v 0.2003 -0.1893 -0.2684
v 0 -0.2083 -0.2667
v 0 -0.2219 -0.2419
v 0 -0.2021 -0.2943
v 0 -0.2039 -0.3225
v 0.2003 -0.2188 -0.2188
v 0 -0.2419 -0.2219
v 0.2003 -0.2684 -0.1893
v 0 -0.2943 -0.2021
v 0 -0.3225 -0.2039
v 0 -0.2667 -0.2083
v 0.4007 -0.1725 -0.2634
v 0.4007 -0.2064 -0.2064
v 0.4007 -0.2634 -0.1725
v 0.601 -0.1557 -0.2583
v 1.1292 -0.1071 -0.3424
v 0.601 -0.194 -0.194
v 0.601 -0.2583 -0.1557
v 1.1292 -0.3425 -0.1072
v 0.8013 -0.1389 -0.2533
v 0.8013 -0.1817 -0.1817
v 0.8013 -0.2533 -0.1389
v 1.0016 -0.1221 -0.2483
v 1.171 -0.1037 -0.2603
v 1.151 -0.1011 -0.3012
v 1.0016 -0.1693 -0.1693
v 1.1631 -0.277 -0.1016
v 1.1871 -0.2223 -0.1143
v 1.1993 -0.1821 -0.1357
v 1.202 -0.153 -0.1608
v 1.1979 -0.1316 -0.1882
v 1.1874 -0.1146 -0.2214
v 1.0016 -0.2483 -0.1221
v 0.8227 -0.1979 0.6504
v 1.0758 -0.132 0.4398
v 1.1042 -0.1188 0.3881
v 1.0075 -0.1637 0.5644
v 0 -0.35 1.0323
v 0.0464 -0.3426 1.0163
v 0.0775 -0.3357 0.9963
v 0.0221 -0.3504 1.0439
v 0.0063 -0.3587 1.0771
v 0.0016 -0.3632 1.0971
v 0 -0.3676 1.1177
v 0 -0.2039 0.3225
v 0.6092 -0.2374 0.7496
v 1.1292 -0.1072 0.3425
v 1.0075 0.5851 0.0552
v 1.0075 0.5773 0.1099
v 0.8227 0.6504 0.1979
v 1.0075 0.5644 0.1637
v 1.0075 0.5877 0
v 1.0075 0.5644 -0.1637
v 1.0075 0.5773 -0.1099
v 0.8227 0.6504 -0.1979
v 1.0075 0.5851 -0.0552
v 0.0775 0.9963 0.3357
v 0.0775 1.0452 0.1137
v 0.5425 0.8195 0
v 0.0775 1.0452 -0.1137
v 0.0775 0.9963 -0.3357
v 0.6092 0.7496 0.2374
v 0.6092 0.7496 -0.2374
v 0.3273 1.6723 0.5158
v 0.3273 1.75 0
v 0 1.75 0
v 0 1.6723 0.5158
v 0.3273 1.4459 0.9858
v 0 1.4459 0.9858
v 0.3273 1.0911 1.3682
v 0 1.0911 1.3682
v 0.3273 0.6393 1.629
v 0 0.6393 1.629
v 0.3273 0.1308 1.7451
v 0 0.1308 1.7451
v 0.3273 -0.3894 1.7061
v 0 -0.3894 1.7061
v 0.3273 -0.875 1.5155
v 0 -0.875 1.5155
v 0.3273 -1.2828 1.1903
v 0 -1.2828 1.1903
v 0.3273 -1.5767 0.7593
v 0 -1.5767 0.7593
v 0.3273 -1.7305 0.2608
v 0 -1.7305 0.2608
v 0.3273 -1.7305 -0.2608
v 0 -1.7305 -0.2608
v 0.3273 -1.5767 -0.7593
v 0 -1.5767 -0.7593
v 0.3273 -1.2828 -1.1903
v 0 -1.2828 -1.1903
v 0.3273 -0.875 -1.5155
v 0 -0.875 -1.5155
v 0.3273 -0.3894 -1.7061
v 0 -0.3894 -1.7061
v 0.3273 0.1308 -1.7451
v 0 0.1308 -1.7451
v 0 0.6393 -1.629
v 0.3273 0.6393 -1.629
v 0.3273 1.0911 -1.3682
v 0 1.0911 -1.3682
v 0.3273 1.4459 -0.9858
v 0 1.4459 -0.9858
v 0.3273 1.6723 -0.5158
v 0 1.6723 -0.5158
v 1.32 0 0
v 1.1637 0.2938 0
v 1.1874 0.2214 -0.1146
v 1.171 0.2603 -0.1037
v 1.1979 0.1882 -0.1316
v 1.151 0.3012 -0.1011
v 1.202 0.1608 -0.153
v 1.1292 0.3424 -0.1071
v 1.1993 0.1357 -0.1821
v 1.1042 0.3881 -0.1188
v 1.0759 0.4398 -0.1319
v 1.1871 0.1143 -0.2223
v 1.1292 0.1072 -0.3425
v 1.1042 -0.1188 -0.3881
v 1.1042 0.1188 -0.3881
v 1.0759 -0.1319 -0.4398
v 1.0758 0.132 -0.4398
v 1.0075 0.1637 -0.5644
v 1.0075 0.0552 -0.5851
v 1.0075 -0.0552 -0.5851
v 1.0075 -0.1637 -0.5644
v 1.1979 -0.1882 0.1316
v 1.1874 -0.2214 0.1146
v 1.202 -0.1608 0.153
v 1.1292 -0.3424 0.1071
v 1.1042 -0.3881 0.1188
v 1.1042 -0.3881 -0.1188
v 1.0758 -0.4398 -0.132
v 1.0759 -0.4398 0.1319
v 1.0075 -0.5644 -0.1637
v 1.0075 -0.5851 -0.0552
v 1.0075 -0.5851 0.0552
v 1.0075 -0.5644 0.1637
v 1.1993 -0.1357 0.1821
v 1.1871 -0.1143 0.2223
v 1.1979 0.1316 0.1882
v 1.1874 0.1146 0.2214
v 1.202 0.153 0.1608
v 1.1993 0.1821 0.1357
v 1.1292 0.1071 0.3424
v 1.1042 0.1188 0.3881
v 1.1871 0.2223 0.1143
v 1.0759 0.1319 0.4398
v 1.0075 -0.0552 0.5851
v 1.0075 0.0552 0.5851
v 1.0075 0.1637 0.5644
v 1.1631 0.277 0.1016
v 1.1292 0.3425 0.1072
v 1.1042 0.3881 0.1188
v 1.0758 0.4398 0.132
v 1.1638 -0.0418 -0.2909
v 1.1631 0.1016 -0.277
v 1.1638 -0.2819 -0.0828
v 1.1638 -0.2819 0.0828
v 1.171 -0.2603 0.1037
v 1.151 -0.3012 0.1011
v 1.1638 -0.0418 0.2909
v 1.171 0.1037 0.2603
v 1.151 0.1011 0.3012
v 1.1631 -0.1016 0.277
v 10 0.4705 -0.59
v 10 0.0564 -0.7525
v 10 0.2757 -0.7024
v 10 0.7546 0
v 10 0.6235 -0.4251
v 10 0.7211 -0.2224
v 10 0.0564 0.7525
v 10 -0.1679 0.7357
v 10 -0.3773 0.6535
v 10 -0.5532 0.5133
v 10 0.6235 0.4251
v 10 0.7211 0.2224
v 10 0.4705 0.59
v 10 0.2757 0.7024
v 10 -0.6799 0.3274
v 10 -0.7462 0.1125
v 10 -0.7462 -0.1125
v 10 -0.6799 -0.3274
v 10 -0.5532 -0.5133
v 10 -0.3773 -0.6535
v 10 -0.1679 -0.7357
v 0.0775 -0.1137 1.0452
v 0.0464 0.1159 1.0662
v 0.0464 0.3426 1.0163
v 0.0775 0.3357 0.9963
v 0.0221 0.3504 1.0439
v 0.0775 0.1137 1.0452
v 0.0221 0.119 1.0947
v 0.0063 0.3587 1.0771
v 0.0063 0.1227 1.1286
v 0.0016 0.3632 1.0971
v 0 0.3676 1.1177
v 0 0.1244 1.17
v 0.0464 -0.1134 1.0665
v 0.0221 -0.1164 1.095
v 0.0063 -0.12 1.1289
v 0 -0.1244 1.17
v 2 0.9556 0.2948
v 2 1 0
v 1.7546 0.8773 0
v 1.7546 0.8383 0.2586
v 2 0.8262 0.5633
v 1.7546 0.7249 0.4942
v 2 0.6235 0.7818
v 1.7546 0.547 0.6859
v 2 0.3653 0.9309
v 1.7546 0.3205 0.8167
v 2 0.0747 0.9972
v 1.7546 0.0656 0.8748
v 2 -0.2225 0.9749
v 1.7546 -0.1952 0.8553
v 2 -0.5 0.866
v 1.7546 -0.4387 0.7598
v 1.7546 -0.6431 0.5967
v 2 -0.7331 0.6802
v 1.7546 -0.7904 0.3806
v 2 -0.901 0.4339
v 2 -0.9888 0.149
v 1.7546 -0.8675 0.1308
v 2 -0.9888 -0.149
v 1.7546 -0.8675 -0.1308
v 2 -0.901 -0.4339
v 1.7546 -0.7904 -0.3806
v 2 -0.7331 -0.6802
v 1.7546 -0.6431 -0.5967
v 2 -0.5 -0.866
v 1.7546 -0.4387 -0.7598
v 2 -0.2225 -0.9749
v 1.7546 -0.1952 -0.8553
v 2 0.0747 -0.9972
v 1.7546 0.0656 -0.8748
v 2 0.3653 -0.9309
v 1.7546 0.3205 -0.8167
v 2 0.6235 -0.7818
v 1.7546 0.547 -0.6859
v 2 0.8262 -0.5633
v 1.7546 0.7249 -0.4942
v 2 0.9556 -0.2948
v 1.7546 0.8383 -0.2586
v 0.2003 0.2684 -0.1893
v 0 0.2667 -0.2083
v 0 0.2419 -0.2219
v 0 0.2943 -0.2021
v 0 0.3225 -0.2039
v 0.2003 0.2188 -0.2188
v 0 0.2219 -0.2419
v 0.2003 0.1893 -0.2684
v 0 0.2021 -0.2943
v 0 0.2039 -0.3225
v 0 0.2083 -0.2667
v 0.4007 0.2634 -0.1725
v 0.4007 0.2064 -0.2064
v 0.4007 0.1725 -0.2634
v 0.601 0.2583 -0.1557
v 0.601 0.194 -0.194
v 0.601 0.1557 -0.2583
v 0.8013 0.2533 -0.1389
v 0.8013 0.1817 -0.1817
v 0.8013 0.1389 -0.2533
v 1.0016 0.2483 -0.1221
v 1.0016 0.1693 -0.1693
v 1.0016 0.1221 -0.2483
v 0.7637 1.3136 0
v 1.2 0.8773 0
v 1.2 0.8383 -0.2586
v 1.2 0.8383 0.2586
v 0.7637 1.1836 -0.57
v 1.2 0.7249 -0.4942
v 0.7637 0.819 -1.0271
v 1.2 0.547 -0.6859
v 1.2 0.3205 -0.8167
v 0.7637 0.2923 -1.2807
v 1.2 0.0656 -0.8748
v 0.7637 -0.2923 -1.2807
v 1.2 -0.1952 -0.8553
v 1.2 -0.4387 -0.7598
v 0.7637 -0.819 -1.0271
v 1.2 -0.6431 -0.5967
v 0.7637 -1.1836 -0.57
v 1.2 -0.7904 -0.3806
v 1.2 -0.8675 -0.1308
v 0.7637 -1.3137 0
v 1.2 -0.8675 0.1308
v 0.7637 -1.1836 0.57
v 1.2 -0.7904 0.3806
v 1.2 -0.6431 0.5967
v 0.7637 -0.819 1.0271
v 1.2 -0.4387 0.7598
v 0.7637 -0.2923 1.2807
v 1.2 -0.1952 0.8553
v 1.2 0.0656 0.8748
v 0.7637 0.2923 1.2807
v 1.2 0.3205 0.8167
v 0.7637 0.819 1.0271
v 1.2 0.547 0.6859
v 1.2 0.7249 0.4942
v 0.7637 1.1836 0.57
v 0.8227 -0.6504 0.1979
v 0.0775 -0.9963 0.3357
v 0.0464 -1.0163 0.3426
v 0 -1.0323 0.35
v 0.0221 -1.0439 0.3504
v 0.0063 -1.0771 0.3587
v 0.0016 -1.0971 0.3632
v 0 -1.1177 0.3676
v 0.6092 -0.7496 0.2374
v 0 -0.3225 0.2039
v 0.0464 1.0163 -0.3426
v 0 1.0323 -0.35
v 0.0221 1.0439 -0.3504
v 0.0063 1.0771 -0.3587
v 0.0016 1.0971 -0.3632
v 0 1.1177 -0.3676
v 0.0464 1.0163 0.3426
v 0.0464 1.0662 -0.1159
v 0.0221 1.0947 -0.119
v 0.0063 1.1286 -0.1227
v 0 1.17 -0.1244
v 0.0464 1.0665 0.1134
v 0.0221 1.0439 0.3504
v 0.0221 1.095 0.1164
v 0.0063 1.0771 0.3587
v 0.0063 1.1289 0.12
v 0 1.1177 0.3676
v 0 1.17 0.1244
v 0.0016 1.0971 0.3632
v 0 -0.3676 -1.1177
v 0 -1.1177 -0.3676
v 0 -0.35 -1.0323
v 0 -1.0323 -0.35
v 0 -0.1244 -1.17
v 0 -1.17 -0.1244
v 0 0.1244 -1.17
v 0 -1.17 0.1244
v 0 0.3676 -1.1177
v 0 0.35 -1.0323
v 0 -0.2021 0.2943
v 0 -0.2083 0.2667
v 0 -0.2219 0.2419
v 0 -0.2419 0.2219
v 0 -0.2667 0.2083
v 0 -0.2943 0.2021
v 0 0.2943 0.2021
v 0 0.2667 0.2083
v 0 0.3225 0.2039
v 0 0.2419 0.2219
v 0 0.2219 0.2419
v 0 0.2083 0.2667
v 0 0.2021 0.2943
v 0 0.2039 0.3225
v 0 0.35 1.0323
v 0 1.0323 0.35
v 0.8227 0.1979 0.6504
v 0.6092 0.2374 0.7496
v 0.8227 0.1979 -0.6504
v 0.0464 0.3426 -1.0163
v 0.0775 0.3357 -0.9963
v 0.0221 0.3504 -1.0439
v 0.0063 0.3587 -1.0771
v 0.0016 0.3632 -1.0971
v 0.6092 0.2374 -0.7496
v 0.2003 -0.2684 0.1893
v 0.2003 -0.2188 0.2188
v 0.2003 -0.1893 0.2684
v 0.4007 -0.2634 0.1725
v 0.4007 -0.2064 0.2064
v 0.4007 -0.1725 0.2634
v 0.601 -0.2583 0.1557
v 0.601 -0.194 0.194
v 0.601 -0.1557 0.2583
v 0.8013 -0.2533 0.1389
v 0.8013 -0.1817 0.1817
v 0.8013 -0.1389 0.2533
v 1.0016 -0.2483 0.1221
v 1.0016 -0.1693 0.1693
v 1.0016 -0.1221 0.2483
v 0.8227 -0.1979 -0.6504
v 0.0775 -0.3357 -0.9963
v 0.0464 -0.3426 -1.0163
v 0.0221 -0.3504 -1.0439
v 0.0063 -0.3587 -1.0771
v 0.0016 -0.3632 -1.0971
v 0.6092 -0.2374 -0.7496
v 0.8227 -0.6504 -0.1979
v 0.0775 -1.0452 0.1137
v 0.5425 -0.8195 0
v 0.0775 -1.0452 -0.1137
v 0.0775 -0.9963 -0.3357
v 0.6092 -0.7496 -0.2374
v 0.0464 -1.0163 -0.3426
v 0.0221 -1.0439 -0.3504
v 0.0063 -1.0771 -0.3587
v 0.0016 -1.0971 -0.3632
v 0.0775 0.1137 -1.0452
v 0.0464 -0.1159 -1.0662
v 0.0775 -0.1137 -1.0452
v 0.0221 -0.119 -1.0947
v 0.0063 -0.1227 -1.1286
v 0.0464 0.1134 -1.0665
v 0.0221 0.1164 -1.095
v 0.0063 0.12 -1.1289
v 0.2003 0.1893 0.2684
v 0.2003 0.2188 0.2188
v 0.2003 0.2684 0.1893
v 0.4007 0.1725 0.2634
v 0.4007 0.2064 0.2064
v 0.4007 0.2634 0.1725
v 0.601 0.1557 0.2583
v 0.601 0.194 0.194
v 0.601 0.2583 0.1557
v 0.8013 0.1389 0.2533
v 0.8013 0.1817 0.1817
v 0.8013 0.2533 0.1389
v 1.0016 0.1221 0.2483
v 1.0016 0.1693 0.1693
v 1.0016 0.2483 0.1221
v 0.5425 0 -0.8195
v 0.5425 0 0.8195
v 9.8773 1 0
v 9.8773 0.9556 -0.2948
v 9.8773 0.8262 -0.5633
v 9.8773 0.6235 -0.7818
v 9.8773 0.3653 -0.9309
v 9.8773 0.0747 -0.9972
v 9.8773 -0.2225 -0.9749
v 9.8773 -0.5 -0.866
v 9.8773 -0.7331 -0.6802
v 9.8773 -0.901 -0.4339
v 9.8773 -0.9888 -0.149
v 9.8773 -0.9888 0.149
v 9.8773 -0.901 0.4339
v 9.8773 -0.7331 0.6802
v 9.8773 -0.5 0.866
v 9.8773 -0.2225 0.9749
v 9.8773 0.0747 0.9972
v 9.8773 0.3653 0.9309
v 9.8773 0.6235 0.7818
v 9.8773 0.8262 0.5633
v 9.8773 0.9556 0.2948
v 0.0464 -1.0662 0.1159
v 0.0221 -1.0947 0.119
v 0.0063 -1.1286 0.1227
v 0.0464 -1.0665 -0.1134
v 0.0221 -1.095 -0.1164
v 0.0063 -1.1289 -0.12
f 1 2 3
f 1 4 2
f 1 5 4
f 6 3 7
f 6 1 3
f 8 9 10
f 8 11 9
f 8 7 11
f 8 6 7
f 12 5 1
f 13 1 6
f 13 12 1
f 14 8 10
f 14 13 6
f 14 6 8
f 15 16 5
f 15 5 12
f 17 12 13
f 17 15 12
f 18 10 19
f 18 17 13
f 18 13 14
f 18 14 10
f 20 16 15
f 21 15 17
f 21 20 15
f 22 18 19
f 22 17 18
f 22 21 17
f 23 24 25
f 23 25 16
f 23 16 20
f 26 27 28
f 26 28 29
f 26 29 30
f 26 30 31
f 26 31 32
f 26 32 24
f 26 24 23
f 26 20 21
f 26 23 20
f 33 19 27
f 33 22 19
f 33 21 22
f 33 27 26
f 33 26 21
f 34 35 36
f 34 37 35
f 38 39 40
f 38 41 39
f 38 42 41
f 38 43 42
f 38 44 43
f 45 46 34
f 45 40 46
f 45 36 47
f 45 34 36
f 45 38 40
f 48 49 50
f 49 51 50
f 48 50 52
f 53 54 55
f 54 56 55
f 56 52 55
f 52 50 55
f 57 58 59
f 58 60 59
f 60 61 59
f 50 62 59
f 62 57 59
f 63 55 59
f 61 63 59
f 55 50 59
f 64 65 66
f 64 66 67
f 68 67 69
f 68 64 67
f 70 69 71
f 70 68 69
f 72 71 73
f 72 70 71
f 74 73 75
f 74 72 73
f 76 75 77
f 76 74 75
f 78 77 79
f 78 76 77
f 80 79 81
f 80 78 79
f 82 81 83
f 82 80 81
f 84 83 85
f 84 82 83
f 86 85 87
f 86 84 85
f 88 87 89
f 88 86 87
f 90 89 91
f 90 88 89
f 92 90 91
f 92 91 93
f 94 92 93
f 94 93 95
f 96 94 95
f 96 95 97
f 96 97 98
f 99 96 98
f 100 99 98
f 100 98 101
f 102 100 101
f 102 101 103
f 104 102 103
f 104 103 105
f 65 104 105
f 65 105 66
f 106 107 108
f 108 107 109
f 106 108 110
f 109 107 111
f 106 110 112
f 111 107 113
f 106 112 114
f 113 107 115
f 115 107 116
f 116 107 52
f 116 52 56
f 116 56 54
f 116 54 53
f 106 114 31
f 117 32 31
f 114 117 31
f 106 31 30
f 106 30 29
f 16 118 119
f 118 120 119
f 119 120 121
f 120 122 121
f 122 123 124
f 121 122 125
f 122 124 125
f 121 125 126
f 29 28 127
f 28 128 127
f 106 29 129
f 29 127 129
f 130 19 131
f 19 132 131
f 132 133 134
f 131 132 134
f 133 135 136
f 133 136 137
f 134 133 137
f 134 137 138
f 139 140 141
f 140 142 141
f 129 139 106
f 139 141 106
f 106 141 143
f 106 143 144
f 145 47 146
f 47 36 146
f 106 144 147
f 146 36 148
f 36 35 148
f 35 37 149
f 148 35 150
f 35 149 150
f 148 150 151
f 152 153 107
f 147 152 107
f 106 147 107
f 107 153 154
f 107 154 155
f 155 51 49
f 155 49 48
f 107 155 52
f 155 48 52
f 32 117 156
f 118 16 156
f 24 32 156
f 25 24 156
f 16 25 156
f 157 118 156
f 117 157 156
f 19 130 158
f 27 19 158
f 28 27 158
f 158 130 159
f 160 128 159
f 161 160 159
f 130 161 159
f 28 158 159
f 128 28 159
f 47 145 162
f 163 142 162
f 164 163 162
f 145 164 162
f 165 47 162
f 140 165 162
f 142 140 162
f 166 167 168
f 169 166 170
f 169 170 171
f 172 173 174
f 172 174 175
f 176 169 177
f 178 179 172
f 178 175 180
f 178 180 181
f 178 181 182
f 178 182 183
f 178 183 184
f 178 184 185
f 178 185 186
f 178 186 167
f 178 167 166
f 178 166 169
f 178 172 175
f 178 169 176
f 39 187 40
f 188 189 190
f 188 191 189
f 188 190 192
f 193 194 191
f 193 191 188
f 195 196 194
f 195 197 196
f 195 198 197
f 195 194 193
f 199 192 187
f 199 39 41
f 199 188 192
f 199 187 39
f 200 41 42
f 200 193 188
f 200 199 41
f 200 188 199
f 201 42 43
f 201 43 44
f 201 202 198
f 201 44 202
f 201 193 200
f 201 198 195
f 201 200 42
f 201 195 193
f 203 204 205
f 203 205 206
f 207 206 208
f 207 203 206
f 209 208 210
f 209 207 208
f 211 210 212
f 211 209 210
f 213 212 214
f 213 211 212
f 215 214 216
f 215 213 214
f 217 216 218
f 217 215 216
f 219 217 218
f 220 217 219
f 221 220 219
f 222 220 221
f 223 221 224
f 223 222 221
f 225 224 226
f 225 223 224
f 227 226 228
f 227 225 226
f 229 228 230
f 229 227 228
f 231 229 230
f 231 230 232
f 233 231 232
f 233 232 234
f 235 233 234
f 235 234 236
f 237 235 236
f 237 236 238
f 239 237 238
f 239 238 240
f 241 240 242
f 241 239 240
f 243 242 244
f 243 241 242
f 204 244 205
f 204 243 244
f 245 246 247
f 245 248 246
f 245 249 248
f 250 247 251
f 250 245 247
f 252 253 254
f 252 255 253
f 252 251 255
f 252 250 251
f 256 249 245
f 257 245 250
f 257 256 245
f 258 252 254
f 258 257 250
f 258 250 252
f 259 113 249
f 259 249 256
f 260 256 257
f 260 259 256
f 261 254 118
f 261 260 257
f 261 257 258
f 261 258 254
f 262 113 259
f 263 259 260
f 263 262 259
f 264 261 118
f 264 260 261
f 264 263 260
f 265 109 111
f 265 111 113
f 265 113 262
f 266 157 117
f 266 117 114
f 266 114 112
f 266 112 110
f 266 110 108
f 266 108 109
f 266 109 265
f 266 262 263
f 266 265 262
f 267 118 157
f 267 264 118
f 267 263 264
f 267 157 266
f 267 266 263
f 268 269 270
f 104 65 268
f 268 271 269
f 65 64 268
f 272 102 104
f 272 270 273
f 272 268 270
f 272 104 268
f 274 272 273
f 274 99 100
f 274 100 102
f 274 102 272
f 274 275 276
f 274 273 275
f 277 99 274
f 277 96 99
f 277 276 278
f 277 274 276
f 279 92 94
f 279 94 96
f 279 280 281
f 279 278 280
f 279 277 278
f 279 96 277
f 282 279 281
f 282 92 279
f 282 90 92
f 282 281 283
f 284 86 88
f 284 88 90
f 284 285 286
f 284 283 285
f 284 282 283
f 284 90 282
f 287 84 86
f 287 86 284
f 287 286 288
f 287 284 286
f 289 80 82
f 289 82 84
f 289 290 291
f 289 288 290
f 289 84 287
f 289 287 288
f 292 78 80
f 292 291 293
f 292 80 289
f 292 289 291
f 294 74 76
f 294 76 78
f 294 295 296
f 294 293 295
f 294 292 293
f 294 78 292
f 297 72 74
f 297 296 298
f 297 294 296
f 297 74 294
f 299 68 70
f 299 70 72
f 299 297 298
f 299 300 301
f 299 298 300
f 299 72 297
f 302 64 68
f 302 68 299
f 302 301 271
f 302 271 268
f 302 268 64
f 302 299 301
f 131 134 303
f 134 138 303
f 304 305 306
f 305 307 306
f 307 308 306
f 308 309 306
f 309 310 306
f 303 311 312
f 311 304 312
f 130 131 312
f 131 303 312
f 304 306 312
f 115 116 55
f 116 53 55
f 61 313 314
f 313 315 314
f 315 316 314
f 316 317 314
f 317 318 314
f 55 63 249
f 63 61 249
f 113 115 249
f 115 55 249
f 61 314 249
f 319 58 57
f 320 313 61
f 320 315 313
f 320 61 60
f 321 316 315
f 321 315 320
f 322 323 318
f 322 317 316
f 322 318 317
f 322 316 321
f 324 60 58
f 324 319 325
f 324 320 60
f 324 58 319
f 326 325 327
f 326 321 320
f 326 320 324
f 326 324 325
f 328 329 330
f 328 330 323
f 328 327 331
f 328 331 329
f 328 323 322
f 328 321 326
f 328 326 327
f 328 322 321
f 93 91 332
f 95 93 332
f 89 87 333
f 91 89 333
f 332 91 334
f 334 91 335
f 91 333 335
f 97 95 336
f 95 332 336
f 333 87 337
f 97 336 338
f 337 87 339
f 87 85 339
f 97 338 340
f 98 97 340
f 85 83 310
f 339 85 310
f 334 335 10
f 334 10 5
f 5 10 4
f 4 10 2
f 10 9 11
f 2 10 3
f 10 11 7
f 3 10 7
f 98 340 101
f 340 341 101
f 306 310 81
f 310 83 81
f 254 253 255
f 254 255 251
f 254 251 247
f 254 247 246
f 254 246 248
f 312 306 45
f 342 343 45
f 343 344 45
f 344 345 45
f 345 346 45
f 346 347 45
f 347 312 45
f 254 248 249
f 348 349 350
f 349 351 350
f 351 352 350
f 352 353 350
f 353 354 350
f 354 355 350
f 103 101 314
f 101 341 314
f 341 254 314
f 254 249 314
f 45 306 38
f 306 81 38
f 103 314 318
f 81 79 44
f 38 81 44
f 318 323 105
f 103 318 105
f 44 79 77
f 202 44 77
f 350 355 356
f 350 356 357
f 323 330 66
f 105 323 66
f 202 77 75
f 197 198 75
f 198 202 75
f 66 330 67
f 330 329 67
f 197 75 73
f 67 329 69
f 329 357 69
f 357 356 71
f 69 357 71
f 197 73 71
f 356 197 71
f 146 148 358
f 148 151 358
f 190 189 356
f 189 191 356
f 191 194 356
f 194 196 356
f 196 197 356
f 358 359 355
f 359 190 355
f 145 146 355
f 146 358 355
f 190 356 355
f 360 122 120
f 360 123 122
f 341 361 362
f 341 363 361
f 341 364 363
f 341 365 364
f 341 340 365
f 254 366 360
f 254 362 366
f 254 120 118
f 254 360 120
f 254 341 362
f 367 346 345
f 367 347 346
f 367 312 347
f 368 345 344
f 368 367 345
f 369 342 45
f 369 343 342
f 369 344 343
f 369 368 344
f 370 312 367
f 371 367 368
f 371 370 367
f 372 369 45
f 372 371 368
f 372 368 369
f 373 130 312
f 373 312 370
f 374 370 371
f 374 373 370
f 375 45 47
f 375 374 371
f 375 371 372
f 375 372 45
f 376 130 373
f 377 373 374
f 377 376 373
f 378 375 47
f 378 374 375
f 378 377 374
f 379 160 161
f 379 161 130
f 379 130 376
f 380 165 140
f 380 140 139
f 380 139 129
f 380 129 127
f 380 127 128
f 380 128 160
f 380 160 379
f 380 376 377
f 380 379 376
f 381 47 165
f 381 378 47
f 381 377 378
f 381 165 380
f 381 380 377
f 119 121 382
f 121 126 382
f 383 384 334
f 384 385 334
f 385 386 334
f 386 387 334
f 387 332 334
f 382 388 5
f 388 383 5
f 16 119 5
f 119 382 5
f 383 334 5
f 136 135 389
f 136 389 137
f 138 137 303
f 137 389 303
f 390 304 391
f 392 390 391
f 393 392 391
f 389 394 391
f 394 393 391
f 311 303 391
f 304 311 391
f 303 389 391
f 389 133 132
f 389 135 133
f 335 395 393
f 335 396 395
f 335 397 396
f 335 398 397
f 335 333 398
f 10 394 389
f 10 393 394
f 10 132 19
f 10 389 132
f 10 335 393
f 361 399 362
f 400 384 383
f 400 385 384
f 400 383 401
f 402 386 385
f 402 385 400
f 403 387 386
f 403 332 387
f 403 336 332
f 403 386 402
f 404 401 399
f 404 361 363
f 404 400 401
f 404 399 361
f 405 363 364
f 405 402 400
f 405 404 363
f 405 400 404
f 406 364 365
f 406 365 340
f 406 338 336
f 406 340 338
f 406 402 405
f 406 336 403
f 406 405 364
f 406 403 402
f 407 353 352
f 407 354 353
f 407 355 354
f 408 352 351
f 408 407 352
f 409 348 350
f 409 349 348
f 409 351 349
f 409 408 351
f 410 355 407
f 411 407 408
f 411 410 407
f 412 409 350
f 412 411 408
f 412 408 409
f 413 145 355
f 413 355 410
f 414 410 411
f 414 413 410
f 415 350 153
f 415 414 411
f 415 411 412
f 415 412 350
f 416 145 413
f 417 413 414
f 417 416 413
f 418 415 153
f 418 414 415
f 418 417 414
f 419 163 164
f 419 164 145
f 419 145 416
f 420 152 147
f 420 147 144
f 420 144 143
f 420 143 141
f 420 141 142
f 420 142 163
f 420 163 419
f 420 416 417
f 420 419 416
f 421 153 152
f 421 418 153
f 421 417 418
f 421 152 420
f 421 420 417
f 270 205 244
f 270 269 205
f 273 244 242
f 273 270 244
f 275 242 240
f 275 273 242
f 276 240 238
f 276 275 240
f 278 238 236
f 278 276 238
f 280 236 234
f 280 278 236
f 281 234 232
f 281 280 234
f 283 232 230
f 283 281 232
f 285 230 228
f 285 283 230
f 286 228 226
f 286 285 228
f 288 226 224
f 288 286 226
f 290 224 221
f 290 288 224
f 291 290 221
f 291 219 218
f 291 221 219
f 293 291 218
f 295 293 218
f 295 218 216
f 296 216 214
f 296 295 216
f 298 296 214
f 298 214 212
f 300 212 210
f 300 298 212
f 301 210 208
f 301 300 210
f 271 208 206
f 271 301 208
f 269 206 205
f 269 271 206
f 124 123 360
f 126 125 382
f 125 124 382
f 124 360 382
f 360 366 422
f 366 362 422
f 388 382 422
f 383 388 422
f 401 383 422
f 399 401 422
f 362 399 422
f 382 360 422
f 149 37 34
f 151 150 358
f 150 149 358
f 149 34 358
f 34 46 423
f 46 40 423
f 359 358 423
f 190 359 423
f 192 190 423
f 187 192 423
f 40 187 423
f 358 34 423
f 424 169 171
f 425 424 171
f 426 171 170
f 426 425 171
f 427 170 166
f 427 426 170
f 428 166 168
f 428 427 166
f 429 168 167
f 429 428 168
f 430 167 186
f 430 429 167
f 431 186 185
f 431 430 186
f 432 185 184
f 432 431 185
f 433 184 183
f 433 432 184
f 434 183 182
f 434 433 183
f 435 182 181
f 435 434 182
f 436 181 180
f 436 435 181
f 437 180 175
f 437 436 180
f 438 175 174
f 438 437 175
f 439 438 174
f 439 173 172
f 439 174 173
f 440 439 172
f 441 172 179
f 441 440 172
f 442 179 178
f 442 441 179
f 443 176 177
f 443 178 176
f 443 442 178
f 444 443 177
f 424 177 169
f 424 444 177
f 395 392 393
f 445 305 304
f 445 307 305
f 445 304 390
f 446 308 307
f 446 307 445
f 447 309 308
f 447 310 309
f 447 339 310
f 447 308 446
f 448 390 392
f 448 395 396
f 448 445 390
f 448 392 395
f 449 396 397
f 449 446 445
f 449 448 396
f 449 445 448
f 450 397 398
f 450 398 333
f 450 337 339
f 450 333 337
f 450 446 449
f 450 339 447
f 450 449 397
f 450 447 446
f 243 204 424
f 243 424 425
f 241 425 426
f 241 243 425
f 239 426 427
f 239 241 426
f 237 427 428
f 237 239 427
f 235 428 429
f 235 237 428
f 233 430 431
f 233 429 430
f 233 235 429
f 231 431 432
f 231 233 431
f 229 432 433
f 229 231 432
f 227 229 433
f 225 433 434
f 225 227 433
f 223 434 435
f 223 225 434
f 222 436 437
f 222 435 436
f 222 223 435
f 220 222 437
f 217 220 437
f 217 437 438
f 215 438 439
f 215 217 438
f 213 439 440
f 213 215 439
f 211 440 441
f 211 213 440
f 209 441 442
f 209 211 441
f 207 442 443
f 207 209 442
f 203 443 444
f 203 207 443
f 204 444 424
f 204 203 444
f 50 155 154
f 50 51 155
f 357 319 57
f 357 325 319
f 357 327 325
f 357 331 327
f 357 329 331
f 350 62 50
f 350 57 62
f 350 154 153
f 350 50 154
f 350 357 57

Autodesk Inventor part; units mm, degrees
ref_plane "YZ Plane" through (0, 0, 0) normal (1, 0, 0) x (0, 1, 0)
ref_plane "XZ Plane" through (0, 0, 0) normal (0, 1, 0) x (-1, 0, 0)
sketch "Sketch1" plane through (0, 0, 0) normal (0, 0, 1) x (1, 0, 0)
  line L0 (1.32, 0) -> (10, 0)
  line L1 (10, 0) -> (10, 1)
  line L2 (10, 1) -> (2, 1)
  line L3 (2, 1) -> (1.7546, 0.8773)
  line L4 (1.7546, 0.8773) -> (1.2, 0.8773)
  line L5 (0, 1.75) -> (0, 1.09)
  line L6 (0, 1.09) -> (1.0075, 0.5877)
  line L7 (1.0075, 0.5877) -> (1.32, 0)
  line L8 (-2, 0) -> (12, 0) projected
  line L9 (0, -0.35) -> (0, 2.1) projected
  line L10 (0, 1.75) -> (0.3273, 1.75)
  line L11 (0.3273, 1.75) -> (1.2, 0.8773)
  line L12 (2, 1) -> (1.0773, 1) construction
  dimension "d1" = 8
  dimension "d2" = 2
  dimension "d3" = 1.7546
  dimension "d4" = 2.18
  dimension "d5" = 26.5
  dimension "d6" = 62
  dimension "d7" = 1.32
  dimension "d8" = 0.2454
  dimension "d12" = 3.5
  dimension "d13" = 45
  dimension "d15" = 10
  dimension "d24" = 1.2
revolve "Body" add sketch "Sketch1" angle 360 about axis through (1.32, 0, 0) along (1, 0, 0) contours L7 L6 L5 L10 L11 L4 L3 L2 L1 L0
sketch "Sketch2" plane through (0, 0, 0) normal (-1, 0, 0) x (0, 0, 1)
  line L0 (0, 1.09) -> (0, 0) construction
  line L1 (0, 0) -> (1.09, 0) construction
  arc A0 (0.327, 0) -> (0, 0.327) centre (0, 0) ccw construction
  arc A1 (0.3815, 0) -> (0, 0.3815) centre (0, 0) ccw construction
  arc A2 (1.0323, 0.35) -> (0.35, 1.0323) centre (0, 0) ccw
  line L2 (0, 0) -> (0.7707, 0.7707) construction
  line L3 (0.35, 1.0323) -> (0.2039, 0.3225)
  line L4 (1.0323, 0.35) -> (0.3225, 0.2039)
  arc A3 (0.35, 1.0323) -> (0, 1.09) centre (0, 0) ccw
  arc A4 (1.09, 0) -> (1.0323, 0.35) centre (0, 0) ccw
  line L5 (0, -2.45) -> (0, 2.45) projected
  line L6 (-2.45, 0) -> (2.45, 0) projected
  arc A5 (0.35, -1.0323) -> (1.0323, -0.35) centre (0, 0) ccw
  line L7 (0.35, -1.0323) -> (0.2039, -0.3225)
  line L8 (1.0323, -0.35) -> (0.3225, -0.2039)
  arc A6 (0, -1.09) -> (0.35, -1.0323) centre (0, 0) ccw
  arc A7 (1.0323, -0.35) -> (1.09, 0) centre (0, 0) ccw
  arc A8 (-0.35, 1.0323) -> (-1.0323, 0.35) centre (0, 0) ccw
  line L9 (-0.35, 1.0323) -> (-0.2039, 0.3225)
  line L10 (-1.0323, 0.35) -> (-0.3225, 0.2039)
  arc A9 (0, 1.09) -> (-0.35, 1.0323) centre (0, 0) ccw
  arc A10 (-1.0323, 0.35) -> (-1.09, 0) centre (0, 0) ccw
  arc A11 (-0.35, -1.0323) -> (0, -1.09) centre (0, 0) ccw
  arc A12 (-1.0323, -0.35) -> (-0.35, -1.0323) centre (0, 0) ccw
  arc A13 (-1.09, 0) -> (-1.0323, -0.35) centre (0, 0) ccw
  line L11 (-1.0323, -0.35) -> (-0.3225, -0.2039)
  line L12 (-0.35, -1.0323) -> (-0.2039, -0.3225)
  arc A14 (0.2039, 0.3225) -> (0.3225, 0.2039) centre (0.3022, 0.3022) ccw
  arc A15 (0.3225, -0.2039) -> (0.2039, -0.3225) centre (0.3022, -0.3022) ccw
  arc A16 (-0.3225, 0.2039) -> (-0.2039, 0.3225) centre (-0.3022, 0.3022) ccw
  arc A17 (-0.2039, -0.3225) -> (-0.3225, -0.2039) centre (-0.3022, -0.3022) ccw
  point P0 (0.7707, -0.7707)
  point P1 (-0.7707, 0.7707)
  point P2 (-0.7707, -0.7707)
  dimension "d17" = 0.654
  dimension "d18" = 0.763
  dimension "d19" = 2.18
  dimension "d20" = 45
  dimension "d21" = 0.35
extrude "Slot" add sketch "Sketch2" against normal up to next draft 5 contours L4 A14 L3 A2 | A5 L7 A15 L8 | L9 A16 L10 A8 | A12 L11 A17 L12
fillet "Fillet1" radius 0.14 4 edges at (0, 1.09, 0) (0, 0, -1.09) (0, -1.09, 0) (0, 0, 1.09)
thread "Thread" size "M2x0.4" class "6g" standard "ISO Metric profile" length 8
chamfer "Chamfer1" distance 0.2454 distance2 0.1227 1 edges at (10, -1, 0) measured on face at (10, -0.0858, 0.7069)
ref_plane "Work Plane2" through (3.35, 0, 0) normal (0, 0, -1) x (1, 0, 0)
equation "\"d17\" = 0.3 * SDM"
equation "\"d18\" = 0.35 * SDM"
equation "\"d19\" = SDM"
equation "\"d21\" = 0.5 * SBR"
equation "\"d1\" = GEL"
equation "\"d2\" = GD"
equation "\"d3\" = BDM"
equation "\"d4\" = SDM"
equation "\"d7\" = INTI"
equation "\"d8\" = GAL"
equation "\"d12\" = KOD"
equation "\"d13\" = 0.5 * SEWI"
equation "\"d15\" = NLG"
equation "\"d24\" = KOH"
equation "\"d23\" = 0.2 * SBR"
equation "\"d10\" = GEL"
equation "\"d25\" = -0.5 * SPD + 0.5 * GD"
equation "\"d26\" = 0.5 * GAL"
equation "\"NLG\" = 10"
equation "\"GEL\" = 8"
equation "\"GAL\" = 0.61345 * PTC"
equation "\"SPD\" = NND - 1.2269 * PTC"
equation "\"KOD\" = 3.5"
equation "\"KOH\" = 1.2"
equation "\"SBR\" = 0.7"
equation "\"INTI\" = 1.32"
equation "\"SDM\" = 2.18"
equation "\"GD\" = NND"
equation "\"BDM\" = NND - GAL"
equation "\"SEWI\" = 90deg"
equation "\"d9\" = SDM"
equation "\"GUL\" = 0.61345 * PTC"
equation "\"TOA\" = 30deg"
equation "\"EPV\" = 2.2"
equation "\"THREADDIA\" = 2"
equation "\"RR\" = 0.2"
equation "\"PTC\" = 0.4"
equation "\"NND\" = 2"
equation "\"GD1\" = THREADDIA - 1.2269 * PTC"
properties part number "AS 1427 - M2 x 10" material "Steel, Mild"
